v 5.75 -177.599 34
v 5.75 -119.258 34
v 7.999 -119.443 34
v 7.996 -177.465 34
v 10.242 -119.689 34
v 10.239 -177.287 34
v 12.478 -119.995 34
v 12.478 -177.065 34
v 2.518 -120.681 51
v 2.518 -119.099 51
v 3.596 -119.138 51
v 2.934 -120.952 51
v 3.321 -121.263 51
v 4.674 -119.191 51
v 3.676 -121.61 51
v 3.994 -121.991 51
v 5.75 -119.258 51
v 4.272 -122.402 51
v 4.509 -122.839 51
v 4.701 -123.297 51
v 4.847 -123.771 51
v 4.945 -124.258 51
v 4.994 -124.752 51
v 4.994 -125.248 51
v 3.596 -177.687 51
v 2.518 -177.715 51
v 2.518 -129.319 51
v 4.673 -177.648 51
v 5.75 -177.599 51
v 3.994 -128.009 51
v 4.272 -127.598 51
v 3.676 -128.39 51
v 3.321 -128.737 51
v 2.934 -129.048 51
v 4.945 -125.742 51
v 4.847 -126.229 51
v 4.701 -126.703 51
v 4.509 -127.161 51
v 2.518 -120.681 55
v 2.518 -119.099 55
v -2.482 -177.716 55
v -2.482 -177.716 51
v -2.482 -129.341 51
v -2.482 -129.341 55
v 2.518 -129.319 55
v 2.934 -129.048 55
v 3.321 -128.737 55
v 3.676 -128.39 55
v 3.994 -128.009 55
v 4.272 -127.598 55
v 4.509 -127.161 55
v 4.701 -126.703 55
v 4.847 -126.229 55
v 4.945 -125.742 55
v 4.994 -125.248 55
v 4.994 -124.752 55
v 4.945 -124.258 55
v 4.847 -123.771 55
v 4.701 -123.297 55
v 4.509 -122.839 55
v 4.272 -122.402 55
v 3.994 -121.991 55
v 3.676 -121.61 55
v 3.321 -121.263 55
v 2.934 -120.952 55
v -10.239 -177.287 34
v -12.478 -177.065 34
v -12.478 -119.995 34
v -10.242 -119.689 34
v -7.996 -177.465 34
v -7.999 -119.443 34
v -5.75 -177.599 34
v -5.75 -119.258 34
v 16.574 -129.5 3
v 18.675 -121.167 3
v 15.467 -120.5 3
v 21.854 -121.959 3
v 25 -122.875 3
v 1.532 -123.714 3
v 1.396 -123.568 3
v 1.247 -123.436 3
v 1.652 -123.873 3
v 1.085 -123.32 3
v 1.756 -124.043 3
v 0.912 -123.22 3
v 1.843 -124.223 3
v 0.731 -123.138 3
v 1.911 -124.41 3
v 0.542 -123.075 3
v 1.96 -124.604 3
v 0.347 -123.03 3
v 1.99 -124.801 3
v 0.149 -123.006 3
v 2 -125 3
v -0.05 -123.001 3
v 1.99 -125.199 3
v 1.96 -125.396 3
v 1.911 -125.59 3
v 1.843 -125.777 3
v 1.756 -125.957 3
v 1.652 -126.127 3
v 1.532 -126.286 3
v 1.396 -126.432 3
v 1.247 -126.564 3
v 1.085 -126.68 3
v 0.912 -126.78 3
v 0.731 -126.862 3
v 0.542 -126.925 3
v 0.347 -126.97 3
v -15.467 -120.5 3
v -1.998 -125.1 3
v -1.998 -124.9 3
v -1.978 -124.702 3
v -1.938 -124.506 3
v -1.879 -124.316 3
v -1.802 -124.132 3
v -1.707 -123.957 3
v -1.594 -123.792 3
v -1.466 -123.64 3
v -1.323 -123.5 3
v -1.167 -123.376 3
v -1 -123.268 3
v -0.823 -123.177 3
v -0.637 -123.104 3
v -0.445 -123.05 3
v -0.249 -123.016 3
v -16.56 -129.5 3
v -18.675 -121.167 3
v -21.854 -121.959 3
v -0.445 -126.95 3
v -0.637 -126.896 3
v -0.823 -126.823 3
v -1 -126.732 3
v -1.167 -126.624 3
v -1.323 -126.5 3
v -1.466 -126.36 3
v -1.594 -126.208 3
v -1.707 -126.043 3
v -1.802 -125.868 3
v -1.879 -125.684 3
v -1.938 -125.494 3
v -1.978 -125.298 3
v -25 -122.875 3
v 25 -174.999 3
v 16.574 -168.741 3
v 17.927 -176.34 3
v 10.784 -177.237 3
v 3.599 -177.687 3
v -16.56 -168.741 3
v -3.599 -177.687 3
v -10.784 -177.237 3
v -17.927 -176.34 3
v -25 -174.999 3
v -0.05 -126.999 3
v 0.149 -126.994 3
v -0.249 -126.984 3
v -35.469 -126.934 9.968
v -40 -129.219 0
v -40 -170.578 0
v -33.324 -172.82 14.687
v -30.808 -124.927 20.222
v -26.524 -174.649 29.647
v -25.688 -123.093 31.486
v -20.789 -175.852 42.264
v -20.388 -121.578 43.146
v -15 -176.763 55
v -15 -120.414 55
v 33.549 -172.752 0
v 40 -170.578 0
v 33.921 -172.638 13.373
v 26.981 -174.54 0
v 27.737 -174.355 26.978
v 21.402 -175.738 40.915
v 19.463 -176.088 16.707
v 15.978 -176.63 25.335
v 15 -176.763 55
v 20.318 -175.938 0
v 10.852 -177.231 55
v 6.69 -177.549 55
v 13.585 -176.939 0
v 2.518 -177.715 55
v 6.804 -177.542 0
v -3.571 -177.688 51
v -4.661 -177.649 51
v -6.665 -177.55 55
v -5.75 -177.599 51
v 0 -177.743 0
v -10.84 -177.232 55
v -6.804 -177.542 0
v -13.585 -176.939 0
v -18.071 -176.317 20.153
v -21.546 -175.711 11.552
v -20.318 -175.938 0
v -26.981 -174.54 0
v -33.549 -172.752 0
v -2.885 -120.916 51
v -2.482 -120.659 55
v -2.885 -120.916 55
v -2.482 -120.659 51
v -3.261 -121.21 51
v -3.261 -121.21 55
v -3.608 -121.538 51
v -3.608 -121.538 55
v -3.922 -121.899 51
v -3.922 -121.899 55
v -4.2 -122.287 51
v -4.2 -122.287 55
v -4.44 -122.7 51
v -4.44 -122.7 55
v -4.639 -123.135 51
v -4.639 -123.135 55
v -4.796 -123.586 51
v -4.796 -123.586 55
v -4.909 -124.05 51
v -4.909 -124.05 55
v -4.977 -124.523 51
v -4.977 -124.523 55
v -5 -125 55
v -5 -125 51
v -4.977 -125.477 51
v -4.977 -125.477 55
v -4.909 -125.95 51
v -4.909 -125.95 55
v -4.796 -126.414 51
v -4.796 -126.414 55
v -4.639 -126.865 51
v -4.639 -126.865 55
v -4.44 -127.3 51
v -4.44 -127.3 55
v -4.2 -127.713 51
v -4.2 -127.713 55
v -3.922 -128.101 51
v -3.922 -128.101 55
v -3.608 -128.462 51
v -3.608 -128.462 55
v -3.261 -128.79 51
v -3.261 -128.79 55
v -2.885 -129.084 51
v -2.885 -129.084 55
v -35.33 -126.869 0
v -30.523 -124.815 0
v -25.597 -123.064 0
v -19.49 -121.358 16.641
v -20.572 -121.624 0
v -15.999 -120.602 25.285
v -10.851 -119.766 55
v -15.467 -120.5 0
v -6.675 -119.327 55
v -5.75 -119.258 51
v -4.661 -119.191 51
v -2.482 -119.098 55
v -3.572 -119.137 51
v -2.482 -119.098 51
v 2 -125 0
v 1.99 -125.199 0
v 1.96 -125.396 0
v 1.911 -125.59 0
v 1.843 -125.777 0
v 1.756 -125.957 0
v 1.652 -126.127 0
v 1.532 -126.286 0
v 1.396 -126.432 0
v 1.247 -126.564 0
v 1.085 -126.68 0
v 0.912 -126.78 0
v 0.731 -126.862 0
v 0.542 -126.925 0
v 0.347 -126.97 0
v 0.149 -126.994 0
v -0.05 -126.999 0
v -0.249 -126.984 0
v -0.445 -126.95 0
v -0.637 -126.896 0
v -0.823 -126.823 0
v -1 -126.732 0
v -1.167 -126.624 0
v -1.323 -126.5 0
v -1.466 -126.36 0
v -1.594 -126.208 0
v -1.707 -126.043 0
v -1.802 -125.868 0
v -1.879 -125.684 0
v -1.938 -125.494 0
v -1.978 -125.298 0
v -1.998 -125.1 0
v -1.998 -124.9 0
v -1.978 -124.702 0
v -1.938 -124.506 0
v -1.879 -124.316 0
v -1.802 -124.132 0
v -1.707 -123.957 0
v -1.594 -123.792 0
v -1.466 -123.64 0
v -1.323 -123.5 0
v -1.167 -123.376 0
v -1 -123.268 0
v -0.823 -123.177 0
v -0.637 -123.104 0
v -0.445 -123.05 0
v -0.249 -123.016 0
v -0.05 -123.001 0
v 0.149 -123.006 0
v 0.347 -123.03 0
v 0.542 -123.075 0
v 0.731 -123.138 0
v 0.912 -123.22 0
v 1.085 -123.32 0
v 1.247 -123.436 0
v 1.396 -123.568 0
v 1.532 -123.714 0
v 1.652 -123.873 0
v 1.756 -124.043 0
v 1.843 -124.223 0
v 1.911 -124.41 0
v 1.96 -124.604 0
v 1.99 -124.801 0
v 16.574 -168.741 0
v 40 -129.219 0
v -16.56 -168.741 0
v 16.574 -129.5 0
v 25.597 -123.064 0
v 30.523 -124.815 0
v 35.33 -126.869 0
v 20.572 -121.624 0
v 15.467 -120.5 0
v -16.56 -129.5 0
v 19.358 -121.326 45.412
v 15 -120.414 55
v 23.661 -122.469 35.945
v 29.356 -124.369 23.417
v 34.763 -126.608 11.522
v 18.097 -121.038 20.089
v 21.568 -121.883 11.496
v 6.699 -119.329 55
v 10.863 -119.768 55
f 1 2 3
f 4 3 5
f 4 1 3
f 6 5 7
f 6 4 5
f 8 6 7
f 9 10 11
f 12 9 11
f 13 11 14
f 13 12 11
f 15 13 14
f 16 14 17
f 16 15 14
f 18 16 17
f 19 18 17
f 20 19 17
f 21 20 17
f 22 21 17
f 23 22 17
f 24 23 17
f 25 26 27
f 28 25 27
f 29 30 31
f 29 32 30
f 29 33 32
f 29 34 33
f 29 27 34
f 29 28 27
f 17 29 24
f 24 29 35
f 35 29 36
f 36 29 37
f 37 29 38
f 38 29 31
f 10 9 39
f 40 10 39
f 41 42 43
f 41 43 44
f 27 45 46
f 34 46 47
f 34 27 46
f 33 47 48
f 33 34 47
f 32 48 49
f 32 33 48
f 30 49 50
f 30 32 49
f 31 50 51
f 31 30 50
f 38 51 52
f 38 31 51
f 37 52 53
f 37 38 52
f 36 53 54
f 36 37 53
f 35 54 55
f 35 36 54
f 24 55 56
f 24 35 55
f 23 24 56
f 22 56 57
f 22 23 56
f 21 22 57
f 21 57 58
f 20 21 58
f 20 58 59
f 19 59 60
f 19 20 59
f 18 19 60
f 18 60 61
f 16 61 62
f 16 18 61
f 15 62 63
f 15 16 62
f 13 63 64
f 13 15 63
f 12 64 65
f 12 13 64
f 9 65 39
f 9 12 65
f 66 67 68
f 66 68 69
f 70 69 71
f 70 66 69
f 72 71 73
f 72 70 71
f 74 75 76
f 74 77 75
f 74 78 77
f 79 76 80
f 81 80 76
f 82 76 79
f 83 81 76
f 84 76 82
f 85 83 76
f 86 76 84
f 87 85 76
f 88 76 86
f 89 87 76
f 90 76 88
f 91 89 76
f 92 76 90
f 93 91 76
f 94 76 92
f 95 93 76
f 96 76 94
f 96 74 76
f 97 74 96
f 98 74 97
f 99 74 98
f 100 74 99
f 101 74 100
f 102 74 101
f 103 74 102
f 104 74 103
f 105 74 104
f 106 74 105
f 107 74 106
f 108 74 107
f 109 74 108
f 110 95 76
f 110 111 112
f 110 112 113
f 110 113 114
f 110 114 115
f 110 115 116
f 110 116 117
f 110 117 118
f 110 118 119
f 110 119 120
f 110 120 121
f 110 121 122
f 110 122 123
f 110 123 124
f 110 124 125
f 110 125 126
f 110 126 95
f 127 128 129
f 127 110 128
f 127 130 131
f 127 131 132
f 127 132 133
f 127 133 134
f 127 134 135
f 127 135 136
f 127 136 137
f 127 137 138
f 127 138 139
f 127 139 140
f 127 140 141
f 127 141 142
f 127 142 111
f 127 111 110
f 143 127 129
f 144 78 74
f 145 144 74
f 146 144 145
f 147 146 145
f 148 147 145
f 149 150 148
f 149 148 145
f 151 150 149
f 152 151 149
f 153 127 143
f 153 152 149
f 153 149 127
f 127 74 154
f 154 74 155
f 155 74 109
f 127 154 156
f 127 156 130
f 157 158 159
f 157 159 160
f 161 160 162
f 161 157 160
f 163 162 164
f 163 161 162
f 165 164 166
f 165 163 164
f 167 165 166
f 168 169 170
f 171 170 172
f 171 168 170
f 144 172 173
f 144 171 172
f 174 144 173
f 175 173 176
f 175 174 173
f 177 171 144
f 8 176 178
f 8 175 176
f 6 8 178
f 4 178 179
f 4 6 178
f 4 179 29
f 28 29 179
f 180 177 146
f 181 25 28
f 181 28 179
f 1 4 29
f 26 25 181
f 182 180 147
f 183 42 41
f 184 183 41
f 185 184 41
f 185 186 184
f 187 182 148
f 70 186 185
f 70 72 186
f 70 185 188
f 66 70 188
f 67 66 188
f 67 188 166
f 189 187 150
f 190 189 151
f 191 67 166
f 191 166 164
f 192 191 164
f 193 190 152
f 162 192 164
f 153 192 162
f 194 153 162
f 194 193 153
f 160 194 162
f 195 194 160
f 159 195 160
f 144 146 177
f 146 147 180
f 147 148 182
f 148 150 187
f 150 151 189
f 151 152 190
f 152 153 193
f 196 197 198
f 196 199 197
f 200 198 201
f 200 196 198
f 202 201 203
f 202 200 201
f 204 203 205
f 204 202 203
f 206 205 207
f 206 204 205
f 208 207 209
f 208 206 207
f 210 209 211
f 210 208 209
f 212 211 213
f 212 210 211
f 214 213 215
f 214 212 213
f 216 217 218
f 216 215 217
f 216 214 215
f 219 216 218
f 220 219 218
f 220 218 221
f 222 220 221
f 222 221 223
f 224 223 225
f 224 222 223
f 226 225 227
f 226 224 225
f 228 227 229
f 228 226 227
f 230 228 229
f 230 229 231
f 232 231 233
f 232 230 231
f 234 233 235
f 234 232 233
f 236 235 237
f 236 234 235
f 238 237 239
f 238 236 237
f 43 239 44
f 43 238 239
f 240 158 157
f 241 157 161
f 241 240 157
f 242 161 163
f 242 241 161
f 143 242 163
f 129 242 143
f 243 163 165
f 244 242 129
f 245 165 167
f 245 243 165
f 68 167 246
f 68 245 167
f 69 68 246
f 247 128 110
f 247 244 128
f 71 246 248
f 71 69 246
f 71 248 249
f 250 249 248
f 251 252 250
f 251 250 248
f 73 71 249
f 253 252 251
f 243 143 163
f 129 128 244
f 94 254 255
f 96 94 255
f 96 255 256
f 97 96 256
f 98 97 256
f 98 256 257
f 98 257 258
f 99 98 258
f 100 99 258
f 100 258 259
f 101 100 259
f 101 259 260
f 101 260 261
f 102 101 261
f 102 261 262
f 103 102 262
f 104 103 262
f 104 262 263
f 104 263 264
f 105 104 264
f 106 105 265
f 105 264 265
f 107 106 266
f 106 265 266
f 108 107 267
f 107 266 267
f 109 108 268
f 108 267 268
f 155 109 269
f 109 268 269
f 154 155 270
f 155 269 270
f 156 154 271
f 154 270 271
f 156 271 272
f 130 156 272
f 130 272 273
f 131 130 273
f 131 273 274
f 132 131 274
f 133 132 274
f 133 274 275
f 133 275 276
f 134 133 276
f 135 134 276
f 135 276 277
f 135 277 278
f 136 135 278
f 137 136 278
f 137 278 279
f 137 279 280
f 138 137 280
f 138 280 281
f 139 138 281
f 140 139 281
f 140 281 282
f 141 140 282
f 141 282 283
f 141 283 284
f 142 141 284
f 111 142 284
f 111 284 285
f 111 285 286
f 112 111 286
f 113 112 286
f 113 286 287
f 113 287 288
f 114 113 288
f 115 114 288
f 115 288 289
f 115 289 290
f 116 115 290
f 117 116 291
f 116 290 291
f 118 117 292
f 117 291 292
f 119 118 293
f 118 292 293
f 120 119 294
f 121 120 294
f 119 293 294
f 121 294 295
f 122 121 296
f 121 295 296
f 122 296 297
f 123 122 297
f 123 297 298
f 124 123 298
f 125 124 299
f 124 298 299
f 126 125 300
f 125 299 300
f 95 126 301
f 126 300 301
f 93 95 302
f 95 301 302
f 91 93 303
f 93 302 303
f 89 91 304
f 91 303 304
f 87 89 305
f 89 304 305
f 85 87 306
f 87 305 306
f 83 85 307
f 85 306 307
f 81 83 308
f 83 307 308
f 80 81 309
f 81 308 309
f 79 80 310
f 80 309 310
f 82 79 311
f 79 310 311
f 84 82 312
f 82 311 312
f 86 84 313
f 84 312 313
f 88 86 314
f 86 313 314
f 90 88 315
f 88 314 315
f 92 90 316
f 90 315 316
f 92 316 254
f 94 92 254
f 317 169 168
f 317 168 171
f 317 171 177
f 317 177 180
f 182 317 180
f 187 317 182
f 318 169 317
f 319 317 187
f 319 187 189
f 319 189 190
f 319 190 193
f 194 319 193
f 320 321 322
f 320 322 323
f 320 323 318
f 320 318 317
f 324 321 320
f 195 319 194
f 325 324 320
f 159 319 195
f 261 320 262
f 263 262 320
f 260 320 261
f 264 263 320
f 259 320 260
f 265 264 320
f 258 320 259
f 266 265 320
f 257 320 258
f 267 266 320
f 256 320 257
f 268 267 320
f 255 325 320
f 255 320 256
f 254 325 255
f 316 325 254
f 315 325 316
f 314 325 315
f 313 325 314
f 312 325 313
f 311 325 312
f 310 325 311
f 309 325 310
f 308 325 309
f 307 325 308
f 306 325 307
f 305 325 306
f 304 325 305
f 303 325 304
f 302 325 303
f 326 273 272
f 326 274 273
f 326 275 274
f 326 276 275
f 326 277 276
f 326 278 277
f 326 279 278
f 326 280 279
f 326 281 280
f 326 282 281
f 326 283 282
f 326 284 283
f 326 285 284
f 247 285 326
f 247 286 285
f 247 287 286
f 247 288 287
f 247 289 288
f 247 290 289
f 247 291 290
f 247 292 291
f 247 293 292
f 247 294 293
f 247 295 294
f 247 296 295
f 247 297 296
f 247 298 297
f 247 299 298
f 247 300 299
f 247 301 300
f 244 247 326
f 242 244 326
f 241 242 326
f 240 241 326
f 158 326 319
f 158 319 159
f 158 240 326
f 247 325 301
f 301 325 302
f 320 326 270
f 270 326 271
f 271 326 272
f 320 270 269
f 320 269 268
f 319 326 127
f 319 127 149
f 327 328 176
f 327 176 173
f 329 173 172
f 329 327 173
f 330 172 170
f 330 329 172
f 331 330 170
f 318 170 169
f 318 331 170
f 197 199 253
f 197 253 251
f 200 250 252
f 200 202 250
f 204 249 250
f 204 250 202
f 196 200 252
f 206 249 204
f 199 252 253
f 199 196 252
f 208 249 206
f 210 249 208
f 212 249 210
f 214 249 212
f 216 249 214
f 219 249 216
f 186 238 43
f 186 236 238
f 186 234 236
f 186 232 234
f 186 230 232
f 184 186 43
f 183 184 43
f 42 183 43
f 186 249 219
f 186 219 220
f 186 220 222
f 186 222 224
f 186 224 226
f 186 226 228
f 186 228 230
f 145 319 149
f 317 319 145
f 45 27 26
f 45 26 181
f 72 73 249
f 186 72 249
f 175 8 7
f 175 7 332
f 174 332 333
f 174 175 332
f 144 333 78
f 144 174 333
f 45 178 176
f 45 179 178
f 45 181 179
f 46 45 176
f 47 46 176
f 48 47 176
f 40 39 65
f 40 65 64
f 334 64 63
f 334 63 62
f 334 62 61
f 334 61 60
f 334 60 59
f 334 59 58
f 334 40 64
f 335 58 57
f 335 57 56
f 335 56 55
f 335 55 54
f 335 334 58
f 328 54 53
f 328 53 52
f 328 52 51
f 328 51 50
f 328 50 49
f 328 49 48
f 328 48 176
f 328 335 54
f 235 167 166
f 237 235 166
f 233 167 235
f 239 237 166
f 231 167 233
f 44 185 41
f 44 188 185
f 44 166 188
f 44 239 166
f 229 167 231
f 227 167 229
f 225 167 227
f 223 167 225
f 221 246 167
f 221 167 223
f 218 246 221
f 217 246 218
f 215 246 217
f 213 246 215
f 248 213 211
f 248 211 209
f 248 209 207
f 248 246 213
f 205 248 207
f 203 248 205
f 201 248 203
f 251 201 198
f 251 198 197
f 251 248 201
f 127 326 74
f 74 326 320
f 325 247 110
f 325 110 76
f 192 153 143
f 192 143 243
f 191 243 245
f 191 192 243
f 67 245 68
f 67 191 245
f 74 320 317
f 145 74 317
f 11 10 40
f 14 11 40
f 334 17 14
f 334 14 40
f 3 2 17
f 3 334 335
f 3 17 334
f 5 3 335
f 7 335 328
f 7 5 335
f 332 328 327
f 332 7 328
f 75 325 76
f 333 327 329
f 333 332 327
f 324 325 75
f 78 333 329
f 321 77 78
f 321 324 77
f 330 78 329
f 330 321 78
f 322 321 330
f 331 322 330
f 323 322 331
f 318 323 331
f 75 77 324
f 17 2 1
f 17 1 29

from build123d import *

# Parameters (mm, degrees)
PAD_DEPTH       = 125
POCKET_DEPTH    = 125.001
SKETCH002_W     = 11.5
SKETCH002_H     = 24.578663
POCKET001_DEPTH = 125.001
SKETCH003_W     = 5
SKETCH003_H     = 32.052196
POCKET002_DEPTH = 107
SKETCH004_R     = 2
POCKET003_DEPTH = 5
SKETCH005_R     = 5
POCKET004_DEPTH = 52.001
SKETCH006_W     = 33.133884
SKETCH006_H     = 39.241348
POCKET005_DEPTH = 5
POCKET006_DEPTH = 55.001


with BuildPart() as part:
    # Sketch001 → Pad (new body)
    with BuildSketch(Plane.XZ.offset(62.5)):
        Polygon((-40, 0), (-15, 55), (15, 55), (40, 0), align=None)
    extrude(amount=PAD_DEPTH)

    # Sketch (on Face6 of Pad) → Pocket (cut, through all)
    with BuildSketch(Plane.XZ.offset(187.5)):
        Polygon((-12.478369, 34), (12.478369, 34), (25, 3), (-25, 3), align=None)
    extrude(amount=-POCKET_DEPTH, mode=Mode.SUBTRACT)

    # Sketch002 (on Face5 of Pocket) → Pocket001 (cut, through all)
    with BuildSketch(Plane.XZ.offset(187.5)):
        with Locations((0, 38.710668)):
            Rectangle(SKETCH002_W, SKETCH002_H)
    extrude(amount=-POCKET001_DEPTH, mode=Mode.SUBTRACT)

    # Sketch003 (on Face5 of Pocket001) → Pocket002 (cut)
    with BuildSketch(Plane.XZ.offset(187.5)):
        with Locations((0.018413, 60.238085)):
            Rectangle(SKETCH003_W, SKETCH003_H)
    extrude(amount=-POCKET002_DEPTH, mode=Mode.SUBTRACT)

    # Sketch004 (on Face2 of Pocket002) → Pocket003 (cut)
    with BuildSketch(Plane(origin=(0, -62.5, 0), x_dir=(1, 0, 0), z_dir=(0, 0, -1))):
        with Locations((0, 62.5)):
            Circle(SKETCH004_R)
    extrude(amount=-POCKET003_DEPTH, mode=Mode.SUBTRACT)

    # Sketch005 (on Face11 of Pocket003) → Pocket004 (cut, through all)
    with BuildSketch(Plane(origin=(0, -62.5, 3), x_dir=(-1, 0, 0), z_dir=(0, 0, 1))):
        with Locations((0, 62.5)):
            Circle(SKETCH005_R)
    extrude(amount=POCKET004_DEPTH, mode=Mode.SUBTRACT)

    # Sketch006 (on Face2 of Pocket004) → Pocket005 (cut)
    with BuildSketch(Plane(origin=(0, -62.5, 0), x_dir=(1, 0, 0), z_dir=(0, 0, -1))):
        with Locations((0.007028, 86.620669)):
            Rectangle(SKETCH006_W, SKETCH006_H)
        with Locations((-0.007028, 38.379331)):
            Rectangle(SKETCH006_W, SKETCH006_H)
    extrude(amount=-POCKET005_DEPTH, mode=Mode.SUBTRACT)

    # Sketch007 (on Face2 of Pocket005) → Pocket006 (cut, through all)
    with BuildSketch(Plane(origin=(0, -62.5, 0), x_dir=(1, 0, 0), z_dir=(0, 0, -1))):
        with BuildLine():
            ThreePointArc((57.666743, 99.777191), (0.524103, 115.241774), (-56.756832, 100.297573))
            Line((-66.493973, 135.547501), (-56.756832, 100.297573))
            Line((80.722458, 130.041382), (-66.493973, 135.547501))
            Line((65.916746, 95.009059), (80.722458, 130.041382))
            Line((57.666743, 99.777191), (65.916746, 95.009059))
        make_face()
        with BuildLine():
            ThreePointArc((-48.384384, 71.931989), (1.820118, 56.580716), (51.310891, 74.096909))
            Line((51.310891, 74.096909), (53.523094, 75.808954))
            Line((53.523094, 75.808954), (72.60817, -29.346481))
            Line((72.60817, -29.346481), (-27.661308, -61.224059))
            Line((-27.661308, -61.224059), (-105.616463, 40.204582))
            Line((-105.616463, 40.204582), (-48.384384, 71.931989))
        make_face()
    extrude(amount=-POCKET006_DEPTH, mode=Mode.SUBTRACT)


solid = part.part
